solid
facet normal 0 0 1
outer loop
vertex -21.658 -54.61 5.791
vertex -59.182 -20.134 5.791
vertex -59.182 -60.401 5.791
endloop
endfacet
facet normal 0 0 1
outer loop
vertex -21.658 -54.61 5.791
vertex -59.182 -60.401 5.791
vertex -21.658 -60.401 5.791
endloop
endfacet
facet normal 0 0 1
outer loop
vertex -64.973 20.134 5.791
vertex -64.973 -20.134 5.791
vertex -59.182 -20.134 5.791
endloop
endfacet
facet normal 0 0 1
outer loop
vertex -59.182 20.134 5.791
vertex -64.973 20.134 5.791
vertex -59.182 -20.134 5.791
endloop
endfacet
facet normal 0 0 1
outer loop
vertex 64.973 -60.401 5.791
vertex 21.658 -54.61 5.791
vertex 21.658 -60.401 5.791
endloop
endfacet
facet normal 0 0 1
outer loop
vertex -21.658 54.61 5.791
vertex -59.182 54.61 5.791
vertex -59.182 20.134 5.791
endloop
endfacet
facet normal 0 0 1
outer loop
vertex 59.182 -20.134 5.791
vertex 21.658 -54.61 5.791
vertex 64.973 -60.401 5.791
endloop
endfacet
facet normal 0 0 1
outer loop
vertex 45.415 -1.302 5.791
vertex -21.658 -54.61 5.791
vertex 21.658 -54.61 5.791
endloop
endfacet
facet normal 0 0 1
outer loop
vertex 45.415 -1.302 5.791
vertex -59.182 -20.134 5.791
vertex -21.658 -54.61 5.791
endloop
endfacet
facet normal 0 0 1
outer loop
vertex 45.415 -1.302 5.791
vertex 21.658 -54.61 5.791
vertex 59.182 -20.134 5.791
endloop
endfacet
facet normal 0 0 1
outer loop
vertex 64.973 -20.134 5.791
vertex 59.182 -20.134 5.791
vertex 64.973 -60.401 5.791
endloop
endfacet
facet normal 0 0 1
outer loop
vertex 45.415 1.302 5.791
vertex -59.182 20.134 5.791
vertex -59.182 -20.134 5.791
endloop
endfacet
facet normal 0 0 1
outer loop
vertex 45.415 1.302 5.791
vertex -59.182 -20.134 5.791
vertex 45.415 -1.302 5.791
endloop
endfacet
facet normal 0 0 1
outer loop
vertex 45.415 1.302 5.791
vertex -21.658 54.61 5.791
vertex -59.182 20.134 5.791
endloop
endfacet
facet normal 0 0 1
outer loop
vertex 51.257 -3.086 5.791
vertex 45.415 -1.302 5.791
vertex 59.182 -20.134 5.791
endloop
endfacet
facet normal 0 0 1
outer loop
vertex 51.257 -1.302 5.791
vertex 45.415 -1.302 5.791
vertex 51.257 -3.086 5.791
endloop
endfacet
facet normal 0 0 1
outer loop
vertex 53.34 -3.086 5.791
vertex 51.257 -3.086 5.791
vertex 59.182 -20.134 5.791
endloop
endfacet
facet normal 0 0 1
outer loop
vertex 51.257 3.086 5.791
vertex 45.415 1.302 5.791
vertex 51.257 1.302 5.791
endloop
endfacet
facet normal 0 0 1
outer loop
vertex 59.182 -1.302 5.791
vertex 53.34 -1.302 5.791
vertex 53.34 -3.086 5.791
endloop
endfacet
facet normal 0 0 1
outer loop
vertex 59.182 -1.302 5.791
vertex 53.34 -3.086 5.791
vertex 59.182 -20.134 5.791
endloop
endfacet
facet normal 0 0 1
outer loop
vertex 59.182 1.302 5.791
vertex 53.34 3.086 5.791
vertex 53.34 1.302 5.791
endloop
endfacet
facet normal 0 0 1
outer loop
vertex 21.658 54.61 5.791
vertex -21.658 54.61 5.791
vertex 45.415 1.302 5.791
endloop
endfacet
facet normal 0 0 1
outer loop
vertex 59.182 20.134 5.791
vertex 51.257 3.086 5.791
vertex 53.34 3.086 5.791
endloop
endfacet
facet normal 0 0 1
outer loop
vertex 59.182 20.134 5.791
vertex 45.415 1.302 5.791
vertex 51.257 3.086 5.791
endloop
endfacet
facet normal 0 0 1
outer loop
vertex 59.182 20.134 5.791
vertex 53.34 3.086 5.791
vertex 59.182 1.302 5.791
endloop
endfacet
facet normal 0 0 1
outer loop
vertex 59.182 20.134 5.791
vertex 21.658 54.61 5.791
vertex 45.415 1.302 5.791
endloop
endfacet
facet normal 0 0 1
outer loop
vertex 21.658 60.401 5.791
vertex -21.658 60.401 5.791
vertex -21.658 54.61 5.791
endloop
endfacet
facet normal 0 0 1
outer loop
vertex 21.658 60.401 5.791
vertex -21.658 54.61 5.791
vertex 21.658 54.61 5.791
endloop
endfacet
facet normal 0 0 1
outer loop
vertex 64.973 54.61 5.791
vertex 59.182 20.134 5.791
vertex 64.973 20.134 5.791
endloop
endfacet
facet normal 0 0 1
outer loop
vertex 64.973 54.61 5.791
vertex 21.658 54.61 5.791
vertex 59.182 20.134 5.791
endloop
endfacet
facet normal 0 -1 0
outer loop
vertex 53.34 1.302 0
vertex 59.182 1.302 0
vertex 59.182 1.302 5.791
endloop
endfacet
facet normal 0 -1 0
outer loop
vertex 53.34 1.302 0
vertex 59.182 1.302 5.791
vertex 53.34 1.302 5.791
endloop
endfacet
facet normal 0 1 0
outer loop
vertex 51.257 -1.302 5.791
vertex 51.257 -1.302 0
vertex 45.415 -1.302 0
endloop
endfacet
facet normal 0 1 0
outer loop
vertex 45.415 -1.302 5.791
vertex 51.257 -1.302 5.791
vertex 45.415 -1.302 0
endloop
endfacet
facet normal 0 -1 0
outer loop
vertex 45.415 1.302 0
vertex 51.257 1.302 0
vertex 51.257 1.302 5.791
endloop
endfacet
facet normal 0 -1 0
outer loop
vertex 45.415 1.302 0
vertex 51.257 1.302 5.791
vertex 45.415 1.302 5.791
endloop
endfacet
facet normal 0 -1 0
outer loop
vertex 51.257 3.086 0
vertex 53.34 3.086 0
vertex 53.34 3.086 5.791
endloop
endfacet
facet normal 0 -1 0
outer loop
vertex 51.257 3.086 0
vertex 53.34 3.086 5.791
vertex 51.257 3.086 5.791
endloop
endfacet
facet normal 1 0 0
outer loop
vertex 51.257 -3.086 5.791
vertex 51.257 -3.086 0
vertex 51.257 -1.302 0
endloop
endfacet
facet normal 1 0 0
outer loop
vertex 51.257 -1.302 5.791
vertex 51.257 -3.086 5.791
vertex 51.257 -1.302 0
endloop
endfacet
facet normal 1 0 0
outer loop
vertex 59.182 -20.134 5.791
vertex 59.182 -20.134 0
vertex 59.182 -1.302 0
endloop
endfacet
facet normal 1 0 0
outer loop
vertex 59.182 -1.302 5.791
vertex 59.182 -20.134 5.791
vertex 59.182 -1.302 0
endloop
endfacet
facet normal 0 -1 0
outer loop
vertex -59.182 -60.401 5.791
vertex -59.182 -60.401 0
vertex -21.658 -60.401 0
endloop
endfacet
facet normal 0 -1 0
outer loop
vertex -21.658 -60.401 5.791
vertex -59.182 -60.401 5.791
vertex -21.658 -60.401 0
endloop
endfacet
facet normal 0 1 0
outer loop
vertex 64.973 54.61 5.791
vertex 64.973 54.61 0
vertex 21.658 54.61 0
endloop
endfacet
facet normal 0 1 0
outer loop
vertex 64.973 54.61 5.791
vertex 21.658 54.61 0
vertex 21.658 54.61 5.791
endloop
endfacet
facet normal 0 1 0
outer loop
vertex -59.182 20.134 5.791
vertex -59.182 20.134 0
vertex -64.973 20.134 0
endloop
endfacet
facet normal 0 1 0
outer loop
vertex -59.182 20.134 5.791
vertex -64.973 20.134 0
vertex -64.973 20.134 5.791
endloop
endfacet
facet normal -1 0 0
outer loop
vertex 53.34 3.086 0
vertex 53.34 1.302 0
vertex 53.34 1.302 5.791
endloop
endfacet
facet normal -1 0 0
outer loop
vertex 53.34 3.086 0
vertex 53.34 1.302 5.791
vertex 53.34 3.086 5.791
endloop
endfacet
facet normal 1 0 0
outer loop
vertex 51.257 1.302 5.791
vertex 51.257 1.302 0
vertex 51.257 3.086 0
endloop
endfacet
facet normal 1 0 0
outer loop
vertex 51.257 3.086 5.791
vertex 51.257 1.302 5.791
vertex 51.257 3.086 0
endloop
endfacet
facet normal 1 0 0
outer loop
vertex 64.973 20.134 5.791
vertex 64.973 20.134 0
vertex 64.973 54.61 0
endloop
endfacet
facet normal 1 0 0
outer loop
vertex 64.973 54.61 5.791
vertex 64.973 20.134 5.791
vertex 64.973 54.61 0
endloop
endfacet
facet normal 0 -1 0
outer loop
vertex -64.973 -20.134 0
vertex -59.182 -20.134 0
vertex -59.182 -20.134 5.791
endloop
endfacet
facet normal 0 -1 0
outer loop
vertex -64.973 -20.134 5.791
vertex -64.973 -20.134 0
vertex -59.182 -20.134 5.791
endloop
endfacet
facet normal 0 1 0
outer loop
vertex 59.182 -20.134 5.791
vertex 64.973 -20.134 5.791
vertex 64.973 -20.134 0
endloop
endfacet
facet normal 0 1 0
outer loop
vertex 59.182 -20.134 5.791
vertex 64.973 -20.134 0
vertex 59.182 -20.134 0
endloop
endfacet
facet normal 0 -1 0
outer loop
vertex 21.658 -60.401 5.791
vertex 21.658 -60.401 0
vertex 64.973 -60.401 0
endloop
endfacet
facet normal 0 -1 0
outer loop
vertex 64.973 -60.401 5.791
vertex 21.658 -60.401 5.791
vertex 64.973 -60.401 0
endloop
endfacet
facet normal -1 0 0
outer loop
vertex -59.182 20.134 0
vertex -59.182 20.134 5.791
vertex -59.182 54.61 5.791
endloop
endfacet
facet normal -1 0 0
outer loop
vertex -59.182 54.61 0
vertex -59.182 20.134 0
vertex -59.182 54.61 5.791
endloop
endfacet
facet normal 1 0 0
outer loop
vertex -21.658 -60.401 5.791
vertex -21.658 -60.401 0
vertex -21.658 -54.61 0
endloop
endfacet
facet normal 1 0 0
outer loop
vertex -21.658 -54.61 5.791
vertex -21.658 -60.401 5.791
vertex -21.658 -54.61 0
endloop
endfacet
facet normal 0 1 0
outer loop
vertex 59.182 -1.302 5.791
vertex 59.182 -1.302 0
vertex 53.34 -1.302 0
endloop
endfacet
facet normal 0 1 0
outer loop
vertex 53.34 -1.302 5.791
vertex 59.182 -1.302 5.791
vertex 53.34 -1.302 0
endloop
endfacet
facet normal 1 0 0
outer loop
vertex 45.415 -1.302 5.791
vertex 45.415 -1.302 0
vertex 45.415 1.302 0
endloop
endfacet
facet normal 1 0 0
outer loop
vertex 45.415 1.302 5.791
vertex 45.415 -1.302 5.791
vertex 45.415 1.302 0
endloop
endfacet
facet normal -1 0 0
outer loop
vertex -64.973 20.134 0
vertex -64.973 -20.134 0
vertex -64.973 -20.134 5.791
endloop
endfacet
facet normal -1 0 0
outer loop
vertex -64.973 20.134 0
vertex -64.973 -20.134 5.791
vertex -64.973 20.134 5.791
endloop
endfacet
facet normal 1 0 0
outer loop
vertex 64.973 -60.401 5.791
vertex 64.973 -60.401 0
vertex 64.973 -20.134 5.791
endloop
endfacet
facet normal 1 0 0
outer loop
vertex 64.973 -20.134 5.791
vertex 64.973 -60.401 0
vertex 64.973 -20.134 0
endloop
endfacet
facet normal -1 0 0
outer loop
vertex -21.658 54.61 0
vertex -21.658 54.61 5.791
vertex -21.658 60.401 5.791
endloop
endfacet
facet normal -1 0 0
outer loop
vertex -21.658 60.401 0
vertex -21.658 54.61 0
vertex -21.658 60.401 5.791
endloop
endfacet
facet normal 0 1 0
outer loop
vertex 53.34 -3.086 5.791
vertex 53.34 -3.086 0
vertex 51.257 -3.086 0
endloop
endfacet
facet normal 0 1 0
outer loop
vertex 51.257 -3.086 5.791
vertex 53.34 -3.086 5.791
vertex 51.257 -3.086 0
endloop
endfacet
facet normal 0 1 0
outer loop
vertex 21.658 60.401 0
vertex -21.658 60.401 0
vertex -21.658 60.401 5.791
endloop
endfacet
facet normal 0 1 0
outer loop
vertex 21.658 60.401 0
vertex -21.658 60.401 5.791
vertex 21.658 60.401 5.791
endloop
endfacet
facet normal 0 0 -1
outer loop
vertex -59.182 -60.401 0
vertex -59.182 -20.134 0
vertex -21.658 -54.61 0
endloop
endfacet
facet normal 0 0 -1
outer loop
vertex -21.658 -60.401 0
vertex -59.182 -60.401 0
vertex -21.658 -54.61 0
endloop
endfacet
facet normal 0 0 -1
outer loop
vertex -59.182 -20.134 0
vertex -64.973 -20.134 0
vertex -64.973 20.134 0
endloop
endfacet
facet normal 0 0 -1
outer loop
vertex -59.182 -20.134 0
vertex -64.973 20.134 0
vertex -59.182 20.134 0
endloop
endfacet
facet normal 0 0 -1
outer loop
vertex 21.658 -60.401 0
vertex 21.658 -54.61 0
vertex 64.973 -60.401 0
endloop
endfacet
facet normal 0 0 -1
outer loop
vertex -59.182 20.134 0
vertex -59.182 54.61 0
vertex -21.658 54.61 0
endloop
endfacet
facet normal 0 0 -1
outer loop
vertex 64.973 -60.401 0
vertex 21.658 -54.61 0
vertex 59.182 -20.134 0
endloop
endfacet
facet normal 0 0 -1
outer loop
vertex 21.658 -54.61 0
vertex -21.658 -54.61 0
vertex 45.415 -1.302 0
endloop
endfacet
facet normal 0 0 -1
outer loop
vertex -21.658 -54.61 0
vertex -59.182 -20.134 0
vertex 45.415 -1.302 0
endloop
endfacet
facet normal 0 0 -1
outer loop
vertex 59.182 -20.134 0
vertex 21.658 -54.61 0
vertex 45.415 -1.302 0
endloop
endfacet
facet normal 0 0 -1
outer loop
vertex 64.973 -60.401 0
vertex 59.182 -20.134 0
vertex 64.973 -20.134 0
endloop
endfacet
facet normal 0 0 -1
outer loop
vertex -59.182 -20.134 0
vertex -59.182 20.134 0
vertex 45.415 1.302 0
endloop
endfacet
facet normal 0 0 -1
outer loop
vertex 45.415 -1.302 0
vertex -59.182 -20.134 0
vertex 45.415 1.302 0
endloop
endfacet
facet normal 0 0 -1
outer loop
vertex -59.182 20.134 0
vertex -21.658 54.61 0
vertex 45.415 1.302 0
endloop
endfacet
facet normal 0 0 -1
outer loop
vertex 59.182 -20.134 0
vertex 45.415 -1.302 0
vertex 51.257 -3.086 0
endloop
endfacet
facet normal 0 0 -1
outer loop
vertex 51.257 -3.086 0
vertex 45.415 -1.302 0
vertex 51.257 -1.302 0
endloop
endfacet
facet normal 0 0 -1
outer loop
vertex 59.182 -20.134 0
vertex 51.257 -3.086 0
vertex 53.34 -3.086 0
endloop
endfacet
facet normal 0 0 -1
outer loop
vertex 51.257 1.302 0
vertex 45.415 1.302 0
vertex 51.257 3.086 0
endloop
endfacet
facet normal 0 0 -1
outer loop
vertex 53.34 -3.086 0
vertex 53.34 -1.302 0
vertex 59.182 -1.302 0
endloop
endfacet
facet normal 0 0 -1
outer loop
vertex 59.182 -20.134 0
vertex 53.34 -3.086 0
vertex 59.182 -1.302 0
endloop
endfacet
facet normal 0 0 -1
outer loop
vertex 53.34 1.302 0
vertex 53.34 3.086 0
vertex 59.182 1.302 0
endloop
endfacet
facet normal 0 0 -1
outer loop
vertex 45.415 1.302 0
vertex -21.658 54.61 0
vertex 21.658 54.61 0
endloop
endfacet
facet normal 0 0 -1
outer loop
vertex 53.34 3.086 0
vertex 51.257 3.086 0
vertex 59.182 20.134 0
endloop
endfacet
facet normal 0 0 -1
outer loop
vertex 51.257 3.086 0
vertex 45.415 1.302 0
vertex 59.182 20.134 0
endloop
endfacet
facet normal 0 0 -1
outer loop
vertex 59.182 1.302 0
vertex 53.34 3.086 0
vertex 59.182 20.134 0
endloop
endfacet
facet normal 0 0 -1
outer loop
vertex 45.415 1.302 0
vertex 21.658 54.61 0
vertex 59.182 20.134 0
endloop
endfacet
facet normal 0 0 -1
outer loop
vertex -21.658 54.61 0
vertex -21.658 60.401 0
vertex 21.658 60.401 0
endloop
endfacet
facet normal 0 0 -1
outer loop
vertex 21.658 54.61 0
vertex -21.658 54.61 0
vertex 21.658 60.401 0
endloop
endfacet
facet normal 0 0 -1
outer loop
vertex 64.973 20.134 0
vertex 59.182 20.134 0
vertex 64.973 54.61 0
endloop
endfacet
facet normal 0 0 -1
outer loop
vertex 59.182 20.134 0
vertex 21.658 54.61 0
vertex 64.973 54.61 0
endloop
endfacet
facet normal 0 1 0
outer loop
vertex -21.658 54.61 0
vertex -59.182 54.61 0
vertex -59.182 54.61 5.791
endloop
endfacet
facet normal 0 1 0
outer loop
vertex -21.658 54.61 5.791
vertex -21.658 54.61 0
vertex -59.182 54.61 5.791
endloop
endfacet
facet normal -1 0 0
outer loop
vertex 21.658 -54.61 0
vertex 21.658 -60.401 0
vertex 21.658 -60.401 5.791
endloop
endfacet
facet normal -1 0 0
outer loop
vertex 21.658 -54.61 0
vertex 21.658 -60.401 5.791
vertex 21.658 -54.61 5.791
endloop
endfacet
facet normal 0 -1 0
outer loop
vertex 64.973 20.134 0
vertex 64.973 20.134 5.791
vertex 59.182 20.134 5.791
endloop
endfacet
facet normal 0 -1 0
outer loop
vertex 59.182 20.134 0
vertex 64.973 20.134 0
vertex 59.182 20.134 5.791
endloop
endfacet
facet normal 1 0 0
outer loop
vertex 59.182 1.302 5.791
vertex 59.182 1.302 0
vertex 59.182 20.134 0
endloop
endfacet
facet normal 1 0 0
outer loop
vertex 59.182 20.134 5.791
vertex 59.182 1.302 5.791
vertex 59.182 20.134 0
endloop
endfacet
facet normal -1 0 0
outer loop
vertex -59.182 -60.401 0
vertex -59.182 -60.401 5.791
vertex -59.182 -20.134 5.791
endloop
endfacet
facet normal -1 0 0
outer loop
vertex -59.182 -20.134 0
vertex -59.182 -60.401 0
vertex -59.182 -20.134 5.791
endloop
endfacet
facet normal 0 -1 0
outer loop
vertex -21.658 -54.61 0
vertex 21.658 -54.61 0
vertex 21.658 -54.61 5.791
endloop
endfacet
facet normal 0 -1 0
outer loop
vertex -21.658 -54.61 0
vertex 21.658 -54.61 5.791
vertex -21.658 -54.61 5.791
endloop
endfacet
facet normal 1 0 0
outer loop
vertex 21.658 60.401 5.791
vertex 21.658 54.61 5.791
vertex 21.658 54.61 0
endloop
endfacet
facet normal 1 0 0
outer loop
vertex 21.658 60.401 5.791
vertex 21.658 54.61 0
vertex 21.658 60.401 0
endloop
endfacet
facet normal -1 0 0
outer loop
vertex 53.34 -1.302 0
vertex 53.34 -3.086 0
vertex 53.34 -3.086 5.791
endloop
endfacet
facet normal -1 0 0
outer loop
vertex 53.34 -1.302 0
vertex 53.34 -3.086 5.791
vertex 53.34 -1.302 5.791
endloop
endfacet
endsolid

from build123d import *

# Parameters (mm, degrees)
SKETCH1_W           = 129.9464
SKETCH1_H           = 120.8024
BOSS_EXTRUDE1_DEPTH = 5.7912
SKETCH3_W           = 43.315466666
SKETCH3_H           = 5.7912
CUT_EXTRUDE2_DEPTH  = 89.900841825
SKETCH6_W           = 5.7912
SKETCH6_H           = 40.267466666
CUT_EXTRUDE5_DEPTH  = 89.900841825
SKETCH7_W           = 13.7668
SKETCH7_H           = 2.6035
CUT_EXTRUDE6_DEPTH  = 89.900841825
SKETCH8_W           = 2.0828
SKETCH8_H           = 6.1722
CUT_EXTRUDE7_DEPTH  = 89.900841825
CAVITY1_START       = -64.9732
CAVITY1_OUTLINE_W   = 40.267466667
CAVITY1_OUTLINE_H   = 5.7912
CAVITY1_DEPTH       = 5.7912
CAVITY1_START_2     = 21.657733333
CAVITY1_2_OUTLINE_W = 5.7912
CAVITY1_2_OUTLINE_H = 5.7912
CAVITY1_2_DEPTH     = 43.315466667
CAVITY1_START_3     = -59.182
CAVITY1_3_OUTLINE_W = 5.7912
CAVITY1_3_OUTLINE_H = 5.7912
CAVITY1_3_DEPTH     = 37.524266667


# Read off the part's stored shape, not the designer's step: Cavity1
with BuildPart() as part:
    # Sketch1 → Boss-Extrude1 (new body)
    with BuildSketch(Plane.XY):
        Rectangle(SKETCH1_W, SKETCH1_H)
    extrude(amount=BOSS_EXTRUDE1_DEPTH)

    # Sketch3 → Cut-Extrude2 (cut, through all)
    with BuildSketch(Plane(origin=(0, 0, 0), x_dir=(-1, 0, 0), z_dir=(0, 0, -1))):
        with Locations((0, -57.5056)):
            Rectangle(SKETCH3_W, SKETCH3_H)
    extrude(amount=-CUT_EXTRUDE2_DEPTH, mode=Mode.SUBTRACT)

    # Sketch6 → Cut-Extrude5 (cut, through all)
    with BuildSketch(Plane(origin=(0, 0, 0), x_dir=(-1, 0, 0), z_dir=(0, 0, -1))):
        with Locations((-62.0776, 0)):
            Rectangle(SKETCH6_W, SKETCH6_H)
    extrude(amount=-CUT_EXTRUDE5_DEPTH, mode=Mode.SUBTRACT)

    # Sketch7 → Cut-Extrude6 (cut, through all)
    with BuildSketch(Plane(origin=(0, 0, 0), x_dir=(-1, 0, 0), z_dir=(0, 0, -1))):
        with Locations((-52.2986, 0)):
            Rectangle(SKETCH7_W, SKETCH7_H)
    extrude(amount=-CUT_EXTRUDE6_DEPTH, mode=Mode.SUBTRACT)

    # Sketch8 → Cut-Extrude7 (cut, through all)
    with BuildSketch(Plane(origin=(0, 0, 0), x_dir=(-1, 0, 0), z_dir=(0, 0, -1))):
        with Locations((-52.2986, 0)):
            Rectangle(SKETCH8_W, SKETCH8_H)
    extrude(amount=-CUT_EXTRUDE7_DEPTH, mode=Mode.SUBTRACT)

    # Cavity1 outline → Cavity1 (cut)
    with BuildSketch(Plane.YZ.offset(CAVITY1_START)):
        with Locations((40.267466666, 2.8956)):
            Rectangle(CAVITY1_OUTLINE_W, CAVITY1_OUTLINE_H)
        with Locations((-40.267466666, 2.8956)):
            Rectangle(CAVITY1_OUTLINE_W, CAVITY1_OUTLINE_H)
    extrude(amount=CAVITY1_DEPTH, mode=Mode.SUBTRACT)

    # Cavity1 2 outline → Cavity1 2 (cut)
    with BuildSketch(Plane.YZ.offset(CAVITY1_START_2)):
        with Locations((57.5056, 2.8956)):
            Rectangle(CAVITY1_2_OUTLINE_W, CAVITY1_2_OUTLINE_H)
    extrude(amount=CAVITY1_2_DEPTH, mode=Mode.SUBTRACT)

    # Cavity1 3 outline → Cavity1 3 (cut)
    with BuildSketch(Plane.YZ.offset(CAVITY1_START_3)):
        with Locations((57.5056, 2.8956)):
            Rectangle(CAVITY1_3_OUTLINE_W, CAVITY1_3_OUTLINE_H)
    extrude(amount=CAVITY1_3_DEPTH, mode=Mode.SUBTRACT)


solid = part.part
